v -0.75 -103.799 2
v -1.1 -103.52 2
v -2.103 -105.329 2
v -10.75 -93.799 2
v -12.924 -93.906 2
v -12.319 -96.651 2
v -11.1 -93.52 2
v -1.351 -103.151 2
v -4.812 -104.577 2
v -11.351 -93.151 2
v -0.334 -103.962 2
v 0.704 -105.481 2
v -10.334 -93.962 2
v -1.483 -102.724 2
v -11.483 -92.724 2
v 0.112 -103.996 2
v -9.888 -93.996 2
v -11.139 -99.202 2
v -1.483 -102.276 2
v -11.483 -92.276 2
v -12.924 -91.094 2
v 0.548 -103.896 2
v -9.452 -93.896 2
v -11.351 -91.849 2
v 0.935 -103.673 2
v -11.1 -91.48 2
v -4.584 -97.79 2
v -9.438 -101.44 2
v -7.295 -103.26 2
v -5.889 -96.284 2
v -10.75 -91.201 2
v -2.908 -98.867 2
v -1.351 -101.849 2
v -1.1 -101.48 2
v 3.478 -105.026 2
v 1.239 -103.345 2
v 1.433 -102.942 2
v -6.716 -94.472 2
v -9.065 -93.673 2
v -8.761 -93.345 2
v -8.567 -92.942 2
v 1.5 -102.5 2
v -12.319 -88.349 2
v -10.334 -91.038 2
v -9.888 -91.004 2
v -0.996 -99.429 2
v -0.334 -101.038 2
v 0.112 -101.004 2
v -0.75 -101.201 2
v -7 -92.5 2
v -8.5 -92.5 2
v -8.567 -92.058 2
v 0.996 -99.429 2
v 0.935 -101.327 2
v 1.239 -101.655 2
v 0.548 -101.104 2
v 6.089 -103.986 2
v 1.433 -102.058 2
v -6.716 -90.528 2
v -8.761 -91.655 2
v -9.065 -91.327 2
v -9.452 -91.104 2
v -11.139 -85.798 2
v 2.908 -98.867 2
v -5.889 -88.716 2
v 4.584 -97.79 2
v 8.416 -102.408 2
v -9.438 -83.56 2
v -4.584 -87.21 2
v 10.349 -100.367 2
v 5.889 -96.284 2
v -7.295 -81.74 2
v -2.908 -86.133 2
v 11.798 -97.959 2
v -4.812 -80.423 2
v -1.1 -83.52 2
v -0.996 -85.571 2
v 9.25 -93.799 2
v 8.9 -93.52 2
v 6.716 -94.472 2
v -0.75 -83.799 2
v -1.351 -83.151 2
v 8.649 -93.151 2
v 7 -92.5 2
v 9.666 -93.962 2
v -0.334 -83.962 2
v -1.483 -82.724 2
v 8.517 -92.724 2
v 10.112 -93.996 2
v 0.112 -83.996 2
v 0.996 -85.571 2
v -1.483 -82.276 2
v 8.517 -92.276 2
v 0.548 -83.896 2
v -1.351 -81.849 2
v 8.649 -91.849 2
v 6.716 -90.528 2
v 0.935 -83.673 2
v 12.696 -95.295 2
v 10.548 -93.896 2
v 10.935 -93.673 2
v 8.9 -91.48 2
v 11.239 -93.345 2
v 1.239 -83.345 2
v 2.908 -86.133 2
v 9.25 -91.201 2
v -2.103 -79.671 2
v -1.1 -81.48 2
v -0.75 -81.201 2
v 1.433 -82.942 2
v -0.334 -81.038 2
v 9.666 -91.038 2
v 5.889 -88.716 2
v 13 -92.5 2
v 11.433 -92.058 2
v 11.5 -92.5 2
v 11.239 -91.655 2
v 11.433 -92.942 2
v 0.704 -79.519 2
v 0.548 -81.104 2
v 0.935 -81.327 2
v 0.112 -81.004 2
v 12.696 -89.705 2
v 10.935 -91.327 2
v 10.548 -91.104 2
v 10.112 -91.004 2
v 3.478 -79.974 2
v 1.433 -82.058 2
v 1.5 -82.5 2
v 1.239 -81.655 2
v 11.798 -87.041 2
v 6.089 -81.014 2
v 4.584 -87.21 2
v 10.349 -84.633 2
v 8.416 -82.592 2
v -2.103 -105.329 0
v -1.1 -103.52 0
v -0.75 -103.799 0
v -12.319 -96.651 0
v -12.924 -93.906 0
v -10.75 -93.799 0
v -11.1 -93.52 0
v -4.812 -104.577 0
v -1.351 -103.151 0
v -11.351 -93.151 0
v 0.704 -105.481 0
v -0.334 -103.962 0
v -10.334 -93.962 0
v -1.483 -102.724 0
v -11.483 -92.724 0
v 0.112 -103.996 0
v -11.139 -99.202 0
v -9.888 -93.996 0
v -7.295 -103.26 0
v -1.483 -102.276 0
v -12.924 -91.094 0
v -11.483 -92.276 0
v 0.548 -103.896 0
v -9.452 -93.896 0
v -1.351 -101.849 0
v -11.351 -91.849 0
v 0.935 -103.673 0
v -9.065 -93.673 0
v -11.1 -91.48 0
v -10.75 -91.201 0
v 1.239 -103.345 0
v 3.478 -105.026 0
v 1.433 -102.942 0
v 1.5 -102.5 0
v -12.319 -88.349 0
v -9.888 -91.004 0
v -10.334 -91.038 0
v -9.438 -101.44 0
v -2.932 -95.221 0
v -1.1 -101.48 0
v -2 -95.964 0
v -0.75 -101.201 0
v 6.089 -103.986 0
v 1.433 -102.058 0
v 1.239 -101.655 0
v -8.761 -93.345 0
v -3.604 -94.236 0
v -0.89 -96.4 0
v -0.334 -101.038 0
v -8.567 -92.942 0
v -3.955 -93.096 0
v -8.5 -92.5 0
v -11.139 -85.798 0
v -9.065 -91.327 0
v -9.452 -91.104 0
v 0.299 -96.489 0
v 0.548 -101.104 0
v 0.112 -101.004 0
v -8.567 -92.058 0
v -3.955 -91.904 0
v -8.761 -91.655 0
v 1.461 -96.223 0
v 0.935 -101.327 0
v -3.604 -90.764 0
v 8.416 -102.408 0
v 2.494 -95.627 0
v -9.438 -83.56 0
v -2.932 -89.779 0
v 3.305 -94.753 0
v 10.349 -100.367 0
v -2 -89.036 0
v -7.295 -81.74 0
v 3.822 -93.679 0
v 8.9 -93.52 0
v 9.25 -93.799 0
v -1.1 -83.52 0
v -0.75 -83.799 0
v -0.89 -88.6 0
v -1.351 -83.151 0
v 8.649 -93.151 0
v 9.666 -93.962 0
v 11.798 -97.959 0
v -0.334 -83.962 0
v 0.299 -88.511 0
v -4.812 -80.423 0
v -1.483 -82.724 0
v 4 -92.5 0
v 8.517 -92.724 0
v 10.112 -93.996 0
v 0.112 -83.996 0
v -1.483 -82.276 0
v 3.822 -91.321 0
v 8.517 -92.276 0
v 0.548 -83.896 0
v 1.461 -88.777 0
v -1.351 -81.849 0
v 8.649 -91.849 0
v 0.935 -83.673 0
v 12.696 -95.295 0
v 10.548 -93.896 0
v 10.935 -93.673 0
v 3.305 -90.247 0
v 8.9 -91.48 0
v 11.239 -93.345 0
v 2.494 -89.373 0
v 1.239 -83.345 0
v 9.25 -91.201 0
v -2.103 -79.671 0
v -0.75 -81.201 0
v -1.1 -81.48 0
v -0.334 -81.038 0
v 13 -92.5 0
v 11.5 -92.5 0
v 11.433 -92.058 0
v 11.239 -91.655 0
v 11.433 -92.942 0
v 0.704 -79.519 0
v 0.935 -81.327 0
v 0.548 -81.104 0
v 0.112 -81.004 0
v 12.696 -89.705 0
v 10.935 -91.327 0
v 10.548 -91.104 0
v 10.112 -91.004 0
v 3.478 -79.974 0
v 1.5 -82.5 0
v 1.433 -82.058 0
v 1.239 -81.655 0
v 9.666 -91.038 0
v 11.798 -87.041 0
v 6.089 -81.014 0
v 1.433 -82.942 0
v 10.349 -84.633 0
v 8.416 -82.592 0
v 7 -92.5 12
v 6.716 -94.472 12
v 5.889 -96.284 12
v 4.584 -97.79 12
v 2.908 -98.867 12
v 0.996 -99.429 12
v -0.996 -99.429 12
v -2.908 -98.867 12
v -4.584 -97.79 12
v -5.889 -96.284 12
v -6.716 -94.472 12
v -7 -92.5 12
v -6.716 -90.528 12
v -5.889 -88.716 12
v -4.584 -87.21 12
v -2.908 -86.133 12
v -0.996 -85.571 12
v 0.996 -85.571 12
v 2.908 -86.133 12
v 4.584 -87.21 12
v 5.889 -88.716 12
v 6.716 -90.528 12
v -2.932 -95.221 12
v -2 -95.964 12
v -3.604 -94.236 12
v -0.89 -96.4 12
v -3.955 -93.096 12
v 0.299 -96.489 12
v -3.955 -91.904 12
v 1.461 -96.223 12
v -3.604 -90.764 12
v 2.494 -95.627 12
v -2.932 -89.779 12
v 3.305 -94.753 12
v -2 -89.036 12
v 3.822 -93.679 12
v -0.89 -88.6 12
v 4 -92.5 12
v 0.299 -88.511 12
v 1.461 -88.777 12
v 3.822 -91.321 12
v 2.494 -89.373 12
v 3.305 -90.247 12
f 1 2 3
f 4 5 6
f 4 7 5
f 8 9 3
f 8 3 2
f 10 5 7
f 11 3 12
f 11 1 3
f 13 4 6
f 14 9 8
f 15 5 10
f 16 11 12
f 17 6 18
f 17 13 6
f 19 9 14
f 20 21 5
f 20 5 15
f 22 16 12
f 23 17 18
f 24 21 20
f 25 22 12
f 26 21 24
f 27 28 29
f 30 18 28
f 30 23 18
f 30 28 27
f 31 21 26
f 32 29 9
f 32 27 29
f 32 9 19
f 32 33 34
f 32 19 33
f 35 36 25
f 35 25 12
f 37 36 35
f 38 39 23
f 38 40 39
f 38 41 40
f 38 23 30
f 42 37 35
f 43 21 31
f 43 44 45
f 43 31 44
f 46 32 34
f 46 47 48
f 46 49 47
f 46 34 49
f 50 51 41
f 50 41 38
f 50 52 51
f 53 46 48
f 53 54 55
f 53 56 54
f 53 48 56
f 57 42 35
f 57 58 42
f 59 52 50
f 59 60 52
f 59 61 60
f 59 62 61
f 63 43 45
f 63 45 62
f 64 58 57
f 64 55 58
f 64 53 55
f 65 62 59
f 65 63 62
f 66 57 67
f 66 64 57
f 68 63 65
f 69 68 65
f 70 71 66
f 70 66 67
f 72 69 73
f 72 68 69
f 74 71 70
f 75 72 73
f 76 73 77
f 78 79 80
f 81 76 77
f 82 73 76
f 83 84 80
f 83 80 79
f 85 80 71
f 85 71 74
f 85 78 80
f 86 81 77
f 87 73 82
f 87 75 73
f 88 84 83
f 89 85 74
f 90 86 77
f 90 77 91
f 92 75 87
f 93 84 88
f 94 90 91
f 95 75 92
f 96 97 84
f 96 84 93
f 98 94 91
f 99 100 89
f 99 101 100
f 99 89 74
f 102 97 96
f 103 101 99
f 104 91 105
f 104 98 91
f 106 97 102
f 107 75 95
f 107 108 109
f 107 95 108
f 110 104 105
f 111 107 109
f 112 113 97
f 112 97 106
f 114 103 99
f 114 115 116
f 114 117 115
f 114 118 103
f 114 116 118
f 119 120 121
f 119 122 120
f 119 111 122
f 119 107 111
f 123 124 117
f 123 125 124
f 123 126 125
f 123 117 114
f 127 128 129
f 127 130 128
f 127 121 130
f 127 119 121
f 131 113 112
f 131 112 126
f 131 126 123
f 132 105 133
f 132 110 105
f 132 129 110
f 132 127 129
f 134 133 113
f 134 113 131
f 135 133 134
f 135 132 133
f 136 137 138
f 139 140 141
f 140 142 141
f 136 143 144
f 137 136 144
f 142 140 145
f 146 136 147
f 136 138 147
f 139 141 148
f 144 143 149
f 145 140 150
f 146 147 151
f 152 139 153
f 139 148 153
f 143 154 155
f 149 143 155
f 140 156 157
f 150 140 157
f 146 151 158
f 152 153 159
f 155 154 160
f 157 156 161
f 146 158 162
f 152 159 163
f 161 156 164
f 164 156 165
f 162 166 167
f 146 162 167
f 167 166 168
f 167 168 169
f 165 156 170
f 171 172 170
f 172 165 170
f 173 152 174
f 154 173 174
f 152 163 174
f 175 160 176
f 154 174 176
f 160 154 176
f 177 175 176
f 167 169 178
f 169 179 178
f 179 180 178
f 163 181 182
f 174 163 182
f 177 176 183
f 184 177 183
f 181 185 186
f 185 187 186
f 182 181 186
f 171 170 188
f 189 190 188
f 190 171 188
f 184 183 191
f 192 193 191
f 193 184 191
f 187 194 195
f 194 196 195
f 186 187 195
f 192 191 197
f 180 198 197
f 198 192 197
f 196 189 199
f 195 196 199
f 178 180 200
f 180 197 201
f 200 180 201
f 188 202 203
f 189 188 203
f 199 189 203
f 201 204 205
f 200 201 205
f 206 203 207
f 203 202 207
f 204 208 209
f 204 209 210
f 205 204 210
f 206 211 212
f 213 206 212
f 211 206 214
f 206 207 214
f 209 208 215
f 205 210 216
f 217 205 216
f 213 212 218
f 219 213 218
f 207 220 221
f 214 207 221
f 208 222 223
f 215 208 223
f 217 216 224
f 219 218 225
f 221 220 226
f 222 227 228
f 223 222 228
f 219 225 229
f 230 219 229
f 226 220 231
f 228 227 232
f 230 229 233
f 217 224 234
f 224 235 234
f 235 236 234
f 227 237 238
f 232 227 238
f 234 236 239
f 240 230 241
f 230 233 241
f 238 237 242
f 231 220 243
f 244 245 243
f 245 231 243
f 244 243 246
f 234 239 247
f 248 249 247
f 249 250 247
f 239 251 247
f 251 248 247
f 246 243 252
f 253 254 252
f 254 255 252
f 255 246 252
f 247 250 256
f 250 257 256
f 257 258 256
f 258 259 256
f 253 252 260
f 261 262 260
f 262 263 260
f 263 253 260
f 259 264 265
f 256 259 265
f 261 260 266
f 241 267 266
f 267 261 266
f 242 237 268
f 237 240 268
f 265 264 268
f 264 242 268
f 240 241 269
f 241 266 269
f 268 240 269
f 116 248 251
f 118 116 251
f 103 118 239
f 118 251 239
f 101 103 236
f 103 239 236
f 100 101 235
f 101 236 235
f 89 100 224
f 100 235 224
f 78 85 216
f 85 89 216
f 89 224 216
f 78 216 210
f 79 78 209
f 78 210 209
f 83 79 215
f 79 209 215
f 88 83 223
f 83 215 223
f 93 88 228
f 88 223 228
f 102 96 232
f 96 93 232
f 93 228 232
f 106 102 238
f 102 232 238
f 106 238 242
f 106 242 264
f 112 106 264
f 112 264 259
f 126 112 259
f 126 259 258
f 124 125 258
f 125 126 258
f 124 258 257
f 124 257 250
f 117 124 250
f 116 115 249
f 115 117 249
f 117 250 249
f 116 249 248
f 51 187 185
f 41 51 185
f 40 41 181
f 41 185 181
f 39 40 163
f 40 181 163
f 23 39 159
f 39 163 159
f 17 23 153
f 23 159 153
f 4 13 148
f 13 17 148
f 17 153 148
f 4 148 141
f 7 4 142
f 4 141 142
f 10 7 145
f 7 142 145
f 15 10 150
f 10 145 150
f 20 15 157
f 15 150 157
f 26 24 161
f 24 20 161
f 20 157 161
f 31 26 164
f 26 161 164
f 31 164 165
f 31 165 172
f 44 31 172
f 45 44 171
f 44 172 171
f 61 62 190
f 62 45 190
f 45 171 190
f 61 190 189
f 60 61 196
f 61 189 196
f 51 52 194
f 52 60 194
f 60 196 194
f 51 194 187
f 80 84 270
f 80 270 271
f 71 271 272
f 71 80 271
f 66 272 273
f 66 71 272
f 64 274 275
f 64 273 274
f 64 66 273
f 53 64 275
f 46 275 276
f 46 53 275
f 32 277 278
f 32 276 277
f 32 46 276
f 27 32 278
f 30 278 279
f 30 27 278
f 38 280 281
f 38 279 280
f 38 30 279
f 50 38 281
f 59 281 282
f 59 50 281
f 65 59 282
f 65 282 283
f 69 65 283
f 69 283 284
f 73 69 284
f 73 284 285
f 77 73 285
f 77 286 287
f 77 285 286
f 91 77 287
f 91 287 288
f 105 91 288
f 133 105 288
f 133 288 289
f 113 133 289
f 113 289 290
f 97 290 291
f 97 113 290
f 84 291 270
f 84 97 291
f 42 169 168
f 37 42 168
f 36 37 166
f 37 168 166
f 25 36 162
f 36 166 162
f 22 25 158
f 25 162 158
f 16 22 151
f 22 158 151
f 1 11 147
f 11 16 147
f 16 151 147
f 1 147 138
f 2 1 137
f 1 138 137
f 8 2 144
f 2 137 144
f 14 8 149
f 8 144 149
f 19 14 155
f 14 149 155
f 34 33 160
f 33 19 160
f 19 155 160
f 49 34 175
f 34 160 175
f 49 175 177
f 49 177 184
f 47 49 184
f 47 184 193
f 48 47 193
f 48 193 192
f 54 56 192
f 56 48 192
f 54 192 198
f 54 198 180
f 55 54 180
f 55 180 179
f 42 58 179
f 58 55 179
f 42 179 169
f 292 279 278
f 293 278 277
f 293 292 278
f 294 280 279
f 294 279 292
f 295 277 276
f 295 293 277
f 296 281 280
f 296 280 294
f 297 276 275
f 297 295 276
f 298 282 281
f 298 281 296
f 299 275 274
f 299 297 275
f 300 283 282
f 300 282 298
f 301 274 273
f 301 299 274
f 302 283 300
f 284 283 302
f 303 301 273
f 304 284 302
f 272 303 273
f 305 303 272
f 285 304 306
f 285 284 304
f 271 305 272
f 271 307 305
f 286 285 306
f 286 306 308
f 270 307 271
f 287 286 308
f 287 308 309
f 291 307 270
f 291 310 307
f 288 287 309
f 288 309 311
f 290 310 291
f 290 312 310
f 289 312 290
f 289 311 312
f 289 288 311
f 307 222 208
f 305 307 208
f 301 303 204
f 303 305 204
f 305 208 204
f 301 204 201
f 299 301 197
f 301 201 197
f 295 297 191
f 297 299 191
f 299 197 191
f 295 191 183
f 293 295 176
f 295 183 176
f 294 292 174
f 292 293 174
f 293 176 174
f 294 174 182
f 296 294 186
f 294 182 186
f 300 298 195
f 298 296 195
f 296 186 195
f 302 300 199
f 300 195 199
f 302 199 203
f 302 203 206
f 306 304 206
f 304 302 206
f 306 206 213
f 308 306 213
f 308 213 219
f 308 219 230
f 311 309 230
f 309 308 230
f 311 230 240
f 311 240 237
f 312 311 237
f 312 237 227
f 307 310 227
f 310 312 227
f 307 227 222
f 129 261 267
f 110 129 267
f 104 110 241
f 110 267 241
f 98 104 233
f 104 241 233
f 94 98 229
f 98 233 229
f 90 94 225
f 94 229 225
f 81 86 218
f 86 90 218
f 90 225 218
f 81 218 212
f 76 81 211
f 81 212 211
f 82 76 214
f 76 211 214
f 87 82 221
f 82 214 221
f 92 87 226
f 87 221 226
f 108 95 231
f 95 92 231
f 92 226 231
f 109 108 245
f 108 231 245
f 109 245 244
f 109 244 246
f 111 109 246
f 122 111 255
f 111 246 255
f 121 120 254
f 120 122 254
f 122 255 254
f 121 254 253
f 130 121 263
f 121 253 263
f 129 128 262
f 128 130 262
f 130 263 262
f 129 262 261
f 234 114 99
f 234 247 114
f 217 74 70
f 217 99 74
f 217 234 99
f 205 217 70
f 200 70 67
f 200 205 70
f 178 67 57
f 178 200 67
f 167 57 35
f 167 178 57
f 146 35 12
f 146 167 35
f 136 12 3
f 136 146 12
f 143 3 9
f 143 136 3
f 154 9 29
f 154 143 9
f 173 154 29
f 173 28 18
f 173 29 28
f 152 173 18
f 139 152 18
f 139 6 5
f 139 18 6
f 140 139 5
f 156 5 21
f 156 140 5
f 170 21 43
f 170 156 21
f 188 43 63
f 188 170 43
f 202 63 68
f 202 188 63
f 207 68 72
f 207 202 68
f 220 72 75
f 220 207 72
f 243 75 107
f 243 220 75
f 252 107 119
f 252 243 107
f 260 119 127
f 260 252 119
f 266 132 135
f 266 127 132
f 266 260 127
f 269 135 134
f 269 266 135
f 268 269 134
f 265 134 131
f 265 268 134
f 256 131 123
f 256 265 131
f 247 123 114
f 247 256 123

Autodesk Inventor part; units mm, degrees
ref_plane "YZ Plane" through (0, 0, 0) normal (1, 0, 0) x (0, 1, 0)
ref_plane "Work Plane1" through (0, 0, 0) normal (0, 0, 1) x (1, 0, 0)
sketch "Sketch1" plane through (0, 0, 0) normal (0, 0, 1) x (1, 0, 0)
  circle A0 centre (0, -92.5) radius 4 projected
  circle A1 centre (0, -102.5) radius 1.5 projected
  circle A2 centre (-10, -92.5) radius 1.5 projected
  circle A3 centre (0, -82.5) radius 1.5 projected
  circle A4 centre (10, -92.5) radius 1.5 projected
  circle A5 centre (0, -92.5) radius 13
  circle A6 centre (0, -92.5) radius 7
  point P0 (0, 0)
  dimension "d0" = 26
  dimension "d1" = 14
extrude "Extrusion1" add sketch "Sketch1" along normal blind 2 contours A5
ref_plane "Work Plane2" through (0, 0, 0) normal (0, 0, 1) x (1, 0, 0)
sketch "Sketch2" plane through (0, 0, 0) normal (0, 0, 1) x (1, 0, 0)
  circle A0 centre (0, -92.5) radius 7 projected
  circle A1 centre (0, -92.5) radius 4 projected
  point P0 (0, 0)
extrude "Extrusion2" add sketch "Sketch2" along normal blind 12
properties part number "AcopleBrida8mm" material "Aluminio 6061"
